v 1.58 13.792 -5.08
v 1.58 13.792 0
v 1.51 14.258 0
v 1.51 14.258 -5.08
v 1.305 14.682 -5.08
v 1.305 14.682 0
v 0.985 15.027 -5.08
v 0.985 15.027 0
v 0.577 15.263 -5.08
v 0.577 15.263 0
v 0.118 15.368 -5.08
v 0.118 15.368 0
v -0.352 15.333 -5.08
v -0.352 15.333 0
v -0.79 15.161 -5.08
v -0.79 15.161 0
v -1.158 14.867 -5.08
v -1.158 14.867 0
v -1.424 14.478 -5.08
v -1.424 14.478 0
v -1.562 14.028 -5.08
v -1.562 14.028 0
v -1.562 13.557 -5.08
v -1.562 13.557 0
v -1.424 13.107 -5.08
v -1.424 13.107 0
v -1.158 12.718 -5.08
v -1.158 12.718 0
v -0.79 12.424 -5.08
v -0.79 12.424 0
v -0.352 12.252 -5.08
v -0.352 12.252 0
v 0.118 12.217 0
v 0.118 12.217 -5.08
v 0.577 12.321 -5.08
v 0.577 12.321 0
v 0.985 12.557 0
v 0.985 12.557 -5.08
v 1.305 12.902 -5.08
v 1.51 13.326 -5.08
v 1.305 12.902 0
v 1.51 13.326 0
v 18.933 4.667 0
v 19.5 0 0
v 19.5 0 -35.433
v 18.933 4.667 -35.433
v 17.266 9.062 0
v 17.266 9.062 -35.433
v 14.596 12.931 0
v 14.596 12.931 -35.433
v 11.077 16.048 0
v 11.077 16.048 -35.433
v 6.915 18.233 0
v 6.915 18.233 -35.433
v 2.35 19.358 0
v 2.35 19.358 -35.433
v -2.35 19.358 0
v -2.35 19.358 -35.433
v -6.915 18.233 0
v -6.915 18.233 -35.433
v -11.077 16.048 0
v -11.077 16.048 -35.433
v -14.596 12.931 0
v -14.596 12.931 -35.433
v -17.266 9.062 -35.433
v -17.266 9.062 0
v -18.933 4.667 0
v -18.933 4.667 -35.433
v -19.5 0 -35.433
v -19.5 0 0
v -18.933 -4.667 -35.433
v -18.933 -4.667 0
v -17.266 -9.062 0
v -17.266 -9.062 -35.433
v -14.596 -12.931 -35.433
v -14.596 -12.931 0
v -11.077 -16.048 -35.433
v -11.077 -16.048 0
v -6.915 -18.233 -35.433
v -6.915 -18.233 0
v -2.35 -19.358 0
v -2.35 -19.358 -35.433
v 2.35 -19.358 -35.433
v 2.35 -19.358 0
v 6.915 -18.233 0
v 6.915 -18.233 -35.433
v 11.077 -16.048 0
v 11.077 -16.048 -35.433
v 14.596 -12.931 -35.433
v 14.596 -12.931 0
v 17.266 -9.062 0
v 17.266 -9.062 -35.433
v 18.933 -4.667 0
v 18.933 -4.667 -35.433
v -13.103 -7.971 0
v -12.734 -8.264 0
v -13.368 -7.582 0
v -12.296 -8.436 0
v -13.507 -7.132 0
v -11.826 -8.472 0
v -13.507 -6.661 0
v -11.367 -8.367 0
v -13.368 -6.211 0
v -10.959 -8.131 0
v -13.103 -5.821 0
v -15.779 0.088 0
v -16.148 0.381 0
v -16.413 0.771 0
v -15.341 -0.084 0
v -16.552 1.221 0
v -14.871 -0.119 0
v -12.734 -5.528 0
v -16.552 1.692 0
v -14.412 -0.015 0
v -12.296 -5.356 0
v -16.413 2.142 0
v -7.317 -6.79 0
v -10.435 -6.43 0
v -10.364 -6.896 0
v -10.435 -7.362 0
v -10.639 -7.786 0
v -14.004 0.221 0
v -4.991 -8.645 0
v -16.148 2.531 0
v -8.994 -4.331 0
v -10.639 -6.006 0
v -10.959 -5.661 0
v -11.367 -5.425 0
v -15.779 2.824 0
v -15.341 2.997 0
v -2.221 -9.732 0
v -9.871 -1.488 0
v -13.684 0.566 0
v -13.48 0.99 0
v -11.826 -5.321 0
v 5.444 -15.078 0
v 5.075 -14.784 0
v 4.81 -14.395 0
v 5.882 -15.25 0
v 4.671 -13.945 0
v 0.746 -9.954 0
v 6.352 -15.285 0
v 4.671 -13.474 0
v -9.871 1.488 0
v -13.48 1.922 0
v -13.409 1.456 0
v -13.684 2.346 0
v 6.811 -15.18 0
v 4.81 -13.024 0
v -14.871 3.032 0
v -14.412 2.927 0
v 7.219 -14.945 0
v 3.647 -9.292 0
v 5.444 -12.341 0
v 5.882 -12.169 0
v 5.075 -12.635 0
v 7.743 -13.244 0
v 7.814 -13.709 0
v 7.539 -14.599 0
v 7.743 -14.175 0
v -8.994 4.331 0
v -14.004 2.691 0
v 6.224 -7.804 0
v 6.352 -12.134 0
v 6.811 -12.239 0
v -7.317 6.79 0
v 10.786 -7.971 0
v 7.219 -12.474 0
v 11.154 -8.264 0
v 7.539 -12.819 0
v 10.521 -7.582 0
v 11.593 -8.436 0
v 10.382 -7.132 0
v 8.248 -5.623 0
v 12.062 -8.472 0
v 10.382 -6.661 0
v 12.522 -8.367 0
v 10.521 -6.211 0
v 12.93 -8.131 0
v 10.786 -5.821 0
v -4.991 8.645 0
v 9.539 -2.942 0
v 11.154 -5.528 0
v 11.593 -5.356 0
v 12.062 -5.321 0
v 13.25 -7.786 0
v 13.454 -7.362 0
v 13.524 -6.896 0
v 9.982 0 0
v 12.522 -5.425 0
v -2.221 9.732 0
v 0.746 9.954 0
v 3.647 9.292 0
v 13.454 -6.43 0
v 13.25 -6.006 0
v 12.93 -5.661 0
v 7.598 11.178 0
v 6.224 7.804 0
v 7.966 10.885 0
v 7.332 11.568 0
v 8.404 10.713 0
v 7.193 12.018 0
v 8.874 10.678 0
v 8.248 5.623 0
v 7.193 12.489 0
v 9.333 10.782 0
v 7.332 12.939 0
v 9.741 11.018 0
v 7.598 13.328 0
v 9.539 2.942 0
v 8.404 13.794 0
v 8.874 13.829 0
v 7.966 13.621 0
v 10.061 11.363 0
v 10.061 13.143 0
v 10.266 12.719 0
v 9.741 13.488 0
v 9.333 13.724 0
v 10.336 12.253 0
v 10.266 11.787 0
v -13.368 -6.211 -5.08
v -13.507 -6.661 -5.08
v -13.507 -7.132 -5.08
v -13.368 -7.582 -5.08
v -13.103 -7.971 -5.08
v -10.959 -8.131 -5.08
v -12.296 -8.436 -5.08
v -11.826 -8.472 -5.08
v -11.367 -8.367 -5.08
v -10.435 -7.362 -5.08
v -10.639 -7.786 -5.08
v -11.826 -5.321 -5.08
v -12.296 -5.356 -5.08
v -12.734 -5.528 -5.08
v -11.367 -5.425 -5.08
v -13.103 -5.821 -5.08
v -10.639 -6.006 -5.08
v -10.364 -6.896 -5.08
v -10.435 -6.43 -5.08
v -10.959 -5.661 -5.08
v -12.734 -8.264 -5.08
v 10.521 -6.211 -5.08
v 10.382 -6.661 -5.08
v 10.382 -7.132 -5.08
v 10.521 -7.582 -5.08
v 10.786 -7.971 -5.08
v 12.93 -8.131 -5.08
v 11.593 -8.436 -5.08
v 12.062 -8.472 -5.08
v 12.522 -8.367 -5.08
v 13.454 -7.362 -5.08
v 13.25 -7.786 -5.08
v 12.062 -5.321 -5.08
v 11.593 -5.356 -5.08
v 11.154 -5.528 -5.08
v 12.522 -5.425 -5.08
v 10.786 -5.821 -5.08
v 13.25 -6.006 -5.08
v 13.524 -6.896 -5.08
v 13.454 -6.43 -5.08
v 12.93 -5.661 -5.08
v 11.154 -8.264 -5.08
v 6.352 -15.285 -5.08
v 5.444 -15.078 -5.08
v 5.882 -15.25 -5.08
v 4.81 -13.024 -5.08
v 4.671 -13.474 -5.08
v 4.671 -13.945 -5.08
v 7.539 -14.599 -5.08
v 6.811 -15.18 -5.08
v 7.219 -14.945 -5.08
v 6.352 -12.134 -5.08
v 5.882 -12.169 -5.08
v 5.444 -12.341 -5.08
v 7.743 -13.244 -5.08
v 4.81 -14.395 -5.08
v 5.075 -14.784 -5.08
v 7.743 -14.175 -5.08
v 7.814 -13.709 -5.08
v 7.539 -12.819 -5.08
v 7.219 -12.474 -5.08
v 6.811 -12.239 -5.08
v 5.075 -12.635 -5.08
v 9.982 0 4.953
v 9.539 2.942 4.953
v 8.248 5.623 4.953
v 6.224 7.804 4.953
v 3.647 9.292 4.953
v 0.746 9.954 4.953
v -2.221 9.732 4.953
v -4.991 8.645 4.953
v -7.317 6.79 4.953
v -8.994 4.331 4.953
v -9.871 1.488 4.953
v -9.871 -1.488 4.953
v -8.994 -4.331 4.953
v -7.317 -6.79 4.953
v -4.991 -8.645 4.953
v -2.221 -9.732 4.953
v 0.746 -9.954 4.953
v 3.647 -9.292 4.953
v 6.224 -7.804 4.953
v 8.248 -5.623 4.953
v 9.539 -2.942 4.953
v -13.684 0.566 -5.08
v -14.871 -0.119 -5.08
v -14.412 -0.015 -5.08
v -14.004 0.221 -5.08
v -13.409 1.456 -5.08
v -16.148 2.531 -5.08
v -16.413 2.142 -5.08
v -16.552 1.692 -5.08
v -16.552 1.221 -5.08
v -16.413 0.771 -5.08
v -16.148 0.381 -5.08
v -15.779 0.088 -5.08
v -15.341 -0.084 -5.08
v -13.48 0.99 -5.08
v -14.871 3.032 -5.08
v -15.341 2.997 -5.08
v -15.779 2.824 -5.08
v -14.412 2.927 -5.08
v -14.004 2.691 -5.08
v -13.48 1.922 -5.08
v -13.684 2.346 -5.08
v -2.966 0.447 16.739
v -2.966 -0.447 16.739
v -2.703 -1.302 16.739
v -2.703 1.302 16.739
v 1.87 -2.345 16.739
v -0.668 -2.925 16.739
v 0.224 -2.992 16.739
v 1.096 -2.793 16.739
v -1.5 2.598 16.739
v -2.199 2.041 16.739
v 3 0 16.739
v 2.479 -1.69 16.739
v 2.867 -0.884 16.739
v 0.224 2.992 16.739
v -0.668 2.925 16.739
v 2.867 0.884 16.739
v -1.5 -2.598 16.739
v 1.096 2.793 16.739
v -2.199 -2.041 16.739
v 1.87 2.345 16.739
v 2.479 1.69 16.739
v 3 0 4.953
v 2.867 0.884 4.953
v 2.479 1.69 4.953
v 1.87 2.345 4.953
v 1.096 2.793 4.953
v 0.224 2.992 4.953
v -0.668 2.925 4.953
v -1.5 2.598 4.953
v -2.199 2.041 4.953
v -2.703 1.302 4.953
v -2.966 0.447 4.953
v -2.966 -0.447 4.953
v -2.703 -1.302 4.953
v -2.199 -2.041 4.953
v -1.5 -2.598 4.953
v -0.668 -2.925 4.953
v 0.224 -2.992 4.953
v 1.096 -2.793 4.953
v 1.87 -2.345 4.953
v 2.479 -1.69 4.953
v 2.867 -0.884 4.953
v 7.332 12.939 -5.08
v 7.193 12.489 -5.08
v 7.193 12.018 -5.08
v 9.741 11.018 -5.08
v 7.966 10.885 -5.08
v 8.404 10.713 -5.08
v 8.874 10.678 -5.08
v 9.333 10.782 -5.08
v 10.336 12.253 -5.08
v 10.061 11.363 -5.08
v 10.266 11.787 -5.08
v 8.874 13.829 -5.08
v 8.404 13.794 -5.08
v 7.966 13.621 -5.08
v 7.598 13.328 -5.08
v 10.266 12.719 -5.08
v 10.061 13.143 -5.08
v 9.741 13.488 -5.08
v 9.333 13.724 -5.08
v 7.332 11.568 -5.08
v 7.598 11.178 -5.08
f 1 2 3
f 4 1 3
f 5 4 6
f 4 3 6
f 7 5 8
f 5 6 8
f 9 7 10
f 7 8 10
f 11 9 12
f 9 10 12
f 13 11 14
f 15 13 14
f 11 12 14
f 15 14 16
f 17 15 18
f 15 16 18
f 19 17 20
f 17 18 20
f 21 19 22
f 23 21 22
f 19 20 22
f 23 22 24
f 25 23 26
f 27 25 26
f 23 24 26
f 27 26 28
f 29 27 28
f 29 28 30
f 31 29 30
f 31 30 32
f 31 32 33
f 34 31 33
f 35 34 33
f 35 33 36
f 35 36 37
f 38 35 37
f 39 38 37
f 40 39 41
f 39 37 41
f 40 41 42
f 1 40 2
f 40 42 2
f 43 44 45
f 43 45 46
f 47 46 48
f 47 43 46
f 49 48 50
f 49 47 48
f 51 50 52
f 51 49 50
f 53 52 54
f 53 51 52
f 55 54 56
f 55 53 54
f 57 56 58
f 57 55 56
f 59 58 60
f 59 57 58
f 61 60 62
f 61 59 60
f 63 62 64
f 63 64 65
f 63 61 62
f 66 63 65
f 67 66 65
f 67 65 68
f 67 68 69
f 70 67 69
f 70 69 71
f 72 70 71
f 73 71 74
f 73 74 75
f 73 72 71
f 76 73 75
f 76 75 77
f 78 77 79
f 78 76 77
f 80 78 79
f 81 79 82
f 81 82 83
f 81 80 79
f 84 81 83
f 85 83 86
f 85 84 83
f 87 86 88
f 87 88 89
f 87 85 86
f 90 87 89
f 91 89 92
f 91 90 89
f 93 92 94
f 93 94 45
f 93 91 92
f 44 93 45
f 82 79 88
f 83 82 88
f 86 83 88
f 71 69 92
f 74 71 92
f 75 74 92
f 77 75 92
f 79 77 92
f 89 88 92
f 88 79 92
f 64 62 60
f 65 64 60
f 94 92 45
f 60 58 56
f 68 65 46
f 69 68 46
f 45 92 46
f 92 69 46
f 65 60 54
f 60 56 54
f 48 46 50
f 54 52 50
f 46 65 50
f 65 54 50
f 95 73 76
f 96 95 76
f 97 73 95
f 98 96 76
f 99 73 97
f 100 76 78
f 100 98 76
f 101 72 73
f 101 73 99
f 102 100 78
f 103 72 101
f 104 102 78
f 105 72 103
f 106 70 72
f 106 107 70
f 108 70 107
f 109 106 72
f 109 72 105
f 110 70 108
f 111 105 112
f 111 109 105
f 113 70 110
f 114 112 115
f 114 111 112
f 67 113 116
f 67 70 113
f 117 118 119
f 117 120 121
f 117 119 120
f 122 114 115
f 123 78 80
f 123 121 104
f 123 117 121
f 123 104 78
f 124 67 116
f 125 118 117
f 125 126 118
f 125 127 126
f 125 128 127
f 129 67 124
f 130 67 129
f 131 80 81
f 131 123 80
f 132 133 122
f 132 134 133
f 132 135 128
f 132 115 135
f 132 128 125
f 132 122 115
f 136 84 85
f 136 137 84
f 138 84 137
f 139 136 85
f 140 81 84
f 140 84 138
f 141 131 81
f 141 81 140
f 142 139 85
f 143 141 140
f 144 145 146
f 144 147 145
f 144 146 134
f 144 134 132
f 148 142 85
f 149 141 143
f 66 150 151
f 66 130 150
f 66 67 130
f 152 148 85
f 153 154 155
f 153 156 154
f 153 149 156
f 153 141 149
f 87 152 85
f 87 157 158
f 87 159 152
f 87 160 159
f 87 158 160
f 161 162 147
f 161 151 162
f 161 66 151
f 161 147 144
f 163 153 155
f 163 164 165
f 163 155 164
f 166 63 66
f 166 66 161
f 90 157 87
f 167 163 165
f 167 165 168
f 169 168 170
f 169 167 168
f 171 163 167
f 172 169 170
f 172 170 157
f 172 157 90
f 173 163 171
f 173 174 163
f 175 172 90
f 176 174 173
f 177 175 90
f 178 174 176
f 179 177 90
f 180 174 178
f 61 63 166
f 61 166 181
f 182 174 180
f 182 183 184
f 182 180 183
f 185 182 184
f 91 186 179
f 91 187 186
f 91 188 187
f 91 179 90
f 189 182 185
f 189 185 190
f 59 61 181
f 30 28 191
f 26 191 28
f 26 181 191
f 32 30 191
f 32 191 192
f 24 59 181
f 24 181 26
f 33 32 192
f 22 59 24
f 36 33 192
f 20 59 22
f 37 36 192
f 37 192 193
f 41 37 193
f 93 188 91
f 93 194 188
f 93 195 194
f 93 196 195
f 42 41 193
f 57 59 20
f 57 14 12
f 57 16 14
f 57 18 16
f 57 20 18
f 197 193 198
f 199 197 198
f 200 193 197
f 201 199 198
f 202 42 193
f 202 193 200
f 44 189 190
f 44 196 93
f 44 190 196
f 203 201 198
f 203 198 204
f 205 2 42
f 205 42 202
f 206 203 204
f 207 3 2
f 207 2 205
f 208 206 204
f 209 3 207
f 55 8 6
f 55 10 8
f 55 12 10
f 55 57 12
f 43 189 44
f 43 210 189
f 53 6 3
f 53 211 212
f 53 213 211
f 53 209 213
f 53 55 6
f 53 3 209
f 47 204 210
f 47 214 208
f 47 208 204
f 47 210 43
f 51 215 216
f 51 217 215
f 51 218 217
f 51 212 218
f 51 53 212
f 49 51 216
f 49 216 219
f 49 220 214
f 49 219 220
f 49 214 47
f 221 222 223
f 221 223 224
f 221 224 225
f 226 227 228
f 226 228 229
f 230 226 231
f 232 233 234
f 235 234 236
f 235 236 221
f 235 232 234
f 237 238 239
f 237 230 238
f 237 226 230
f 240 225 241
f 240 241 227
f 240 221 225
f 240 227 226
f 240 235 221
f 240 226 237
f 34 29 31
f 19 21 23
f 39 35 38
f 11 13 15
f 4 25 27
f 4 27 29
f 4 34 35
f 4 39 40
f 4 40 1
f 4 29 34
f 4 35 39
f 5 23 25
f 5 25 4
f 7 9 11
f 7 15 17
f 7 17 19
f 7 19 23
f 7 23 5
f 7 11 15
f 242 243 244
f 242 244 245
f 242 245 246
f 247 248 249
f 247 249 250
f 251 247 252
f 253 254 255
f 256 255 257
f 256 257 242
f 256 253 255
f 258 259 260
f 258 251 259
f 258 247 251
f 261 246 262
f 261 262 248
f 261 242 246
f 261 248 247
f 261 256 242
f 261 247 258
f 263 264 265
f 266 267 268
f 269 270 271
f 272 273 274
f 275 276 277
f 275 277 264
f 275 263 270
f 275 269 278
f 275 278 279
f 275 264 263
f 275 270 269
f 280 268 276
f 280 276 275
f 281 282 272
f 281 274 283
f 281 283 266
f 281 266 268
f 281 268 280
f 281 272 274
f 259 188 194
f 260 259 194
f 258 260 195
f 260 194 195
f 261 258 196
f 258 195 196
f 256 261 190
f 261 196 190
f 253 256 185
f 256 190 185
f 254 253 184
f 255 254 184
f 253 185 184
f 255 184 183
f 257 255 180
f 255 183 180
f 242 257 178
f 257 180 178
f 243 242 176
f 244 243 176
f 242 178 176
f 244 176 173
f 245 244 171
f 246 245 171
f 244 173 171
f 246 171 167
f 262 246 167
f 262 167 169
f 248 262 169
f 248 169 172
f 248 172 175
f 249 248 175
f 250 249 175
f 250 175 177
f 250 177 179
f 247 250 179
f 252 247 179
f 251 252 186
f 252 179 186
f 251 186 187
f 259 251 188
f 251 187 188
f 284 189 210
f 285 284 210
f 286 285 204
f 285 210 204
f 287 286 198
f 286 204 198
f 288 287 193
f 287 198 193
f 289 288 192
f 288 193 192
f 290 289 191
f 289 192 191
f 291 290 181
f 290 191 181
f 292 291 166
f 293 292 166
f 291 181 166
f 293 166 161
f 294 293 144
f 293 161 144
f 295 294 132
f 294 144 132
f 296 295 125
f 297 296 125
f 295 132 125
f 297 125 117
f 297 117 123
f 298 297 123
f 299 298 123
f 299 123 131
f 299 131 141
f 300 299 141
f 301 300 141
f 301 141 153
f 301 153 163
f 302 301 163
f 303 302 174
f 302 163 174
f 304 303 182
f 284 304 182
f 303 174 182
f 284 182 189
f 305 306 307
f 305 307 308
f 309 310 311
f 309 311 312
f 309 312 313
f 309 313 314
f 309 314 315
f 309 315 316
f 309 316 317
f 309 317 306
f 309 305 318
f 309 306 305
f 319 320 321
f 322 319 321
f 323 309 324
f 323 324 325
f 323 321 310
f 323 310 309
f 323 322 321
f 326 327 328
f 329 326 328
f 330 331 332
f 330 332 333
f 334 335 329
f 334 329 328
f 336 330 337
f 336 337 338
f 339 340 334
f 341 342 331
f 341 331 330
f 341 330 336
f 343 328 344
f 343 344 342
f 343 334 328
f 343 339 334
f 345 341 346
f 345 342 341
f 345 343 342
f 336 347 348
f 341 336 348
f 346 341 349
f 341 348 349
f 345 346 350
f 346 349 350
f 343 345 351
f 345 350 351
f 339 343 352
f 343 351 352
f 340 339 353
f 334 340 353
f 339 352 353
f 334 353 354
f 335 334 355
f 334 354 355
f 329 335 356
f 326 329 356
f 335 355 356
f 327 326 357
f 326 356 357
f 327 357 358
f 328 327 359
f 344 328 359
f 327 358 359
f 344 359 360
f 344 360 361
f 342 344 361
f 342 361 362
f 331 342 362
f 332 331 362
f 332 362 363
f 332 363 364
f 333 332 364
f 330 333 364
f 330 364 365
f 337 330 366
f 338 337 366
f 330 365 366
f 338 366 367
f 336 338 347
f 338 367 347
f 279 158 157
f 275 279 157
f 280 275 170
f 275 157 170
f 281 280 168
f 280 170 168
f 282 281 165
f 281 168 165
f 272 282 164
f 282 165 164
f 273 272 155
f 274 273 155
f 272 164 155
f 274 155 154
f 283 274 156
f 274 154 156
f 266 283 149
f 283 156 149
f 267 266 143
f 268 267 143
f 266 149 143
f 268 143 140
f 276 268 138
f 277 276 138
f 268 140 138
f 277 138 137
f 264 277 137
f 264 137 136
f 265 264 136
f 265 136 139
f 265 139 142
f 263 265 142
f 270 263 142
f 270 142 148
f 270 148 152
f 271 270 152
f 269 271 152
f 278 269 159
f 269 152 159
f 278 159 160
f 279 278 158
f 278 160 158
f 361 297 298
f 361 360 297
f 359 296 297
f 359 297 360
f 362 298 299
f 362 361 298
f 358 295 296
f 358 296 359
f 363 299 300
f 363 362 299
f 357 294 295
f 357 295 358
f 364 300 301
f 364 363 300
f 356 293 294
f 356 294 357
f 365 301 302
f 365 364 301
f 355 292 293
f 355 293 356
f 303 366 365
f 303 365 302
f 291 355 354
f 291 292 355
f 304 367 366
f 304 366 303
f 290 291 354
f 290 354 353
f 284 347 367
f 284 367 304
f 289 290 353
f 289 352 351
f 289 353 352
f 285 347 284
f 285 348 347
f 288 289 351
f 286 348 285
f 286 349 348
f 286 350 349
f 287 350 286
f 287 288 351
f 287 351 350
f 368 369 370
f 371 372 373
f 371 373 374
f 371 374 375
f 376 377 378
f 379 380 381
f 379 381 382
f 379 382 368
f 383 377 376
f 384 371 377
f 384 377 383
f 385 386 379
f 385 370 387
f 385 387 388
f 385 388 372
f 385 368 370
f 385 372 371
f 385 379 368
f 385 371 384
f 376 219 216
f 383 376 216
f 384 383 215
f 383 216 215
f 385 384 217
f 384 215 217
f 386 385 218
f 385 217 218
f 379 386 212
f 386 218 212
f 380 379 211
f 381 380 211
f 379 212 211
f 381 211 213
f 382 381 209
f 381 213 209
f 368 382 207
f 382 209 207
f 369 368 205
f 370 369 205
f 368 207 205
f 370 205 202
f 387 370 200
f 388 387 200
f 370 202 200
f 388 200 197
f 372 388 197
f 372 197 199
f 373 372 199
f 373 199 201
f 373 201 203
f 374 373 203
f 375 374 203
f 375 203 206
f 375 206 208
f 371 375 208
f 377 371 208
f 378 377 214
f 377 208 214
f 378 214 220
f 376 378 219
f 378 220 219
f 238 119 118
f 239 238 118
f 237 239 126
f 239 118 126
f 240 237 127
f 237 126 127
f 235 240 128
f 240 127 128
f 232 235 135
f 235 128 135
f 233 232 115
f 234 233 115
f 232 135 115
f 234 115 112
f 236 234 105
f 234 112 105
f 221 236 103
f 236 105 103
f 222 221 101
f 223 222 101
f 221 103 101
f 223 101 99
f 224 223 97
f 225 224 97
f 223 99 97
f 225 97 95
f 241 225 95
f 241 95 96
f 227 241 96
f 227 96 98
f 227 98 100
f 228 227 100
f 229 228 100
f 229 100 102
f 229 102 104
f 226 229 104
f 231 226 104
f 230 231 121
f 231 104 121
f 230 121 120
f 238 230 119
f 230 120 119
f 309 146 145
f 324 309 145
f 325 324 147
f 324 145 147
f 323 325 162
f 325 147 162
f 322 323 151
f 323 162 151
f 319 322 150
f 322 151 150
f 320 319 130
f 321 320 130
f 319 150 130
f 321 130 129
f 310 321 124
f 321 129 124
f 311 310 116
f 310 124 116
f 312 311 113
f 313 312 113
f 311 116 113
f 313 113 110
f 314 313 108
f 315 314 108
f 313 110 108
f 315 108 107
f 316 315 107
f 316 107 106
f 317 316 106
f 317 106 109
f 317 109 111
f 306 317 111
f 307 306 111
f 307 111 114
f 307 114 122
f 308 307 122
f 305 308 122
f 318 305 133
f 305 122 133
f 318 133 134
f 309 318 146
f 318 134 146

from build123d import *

# Parameters (mm, degrees)
SKETCH1_R           = 19.5
BOSS_EXTRUDE1_DEPTH = 35.433
SKETCH2_R           = 9.9822
BOSS_EXTRUDE2_DEPTH = 4.953
SKETCH4_R           = 3
BOSS_EXTRUDE3_DEPTH = 11.7856
SKETCH5_R           = 1.58
CUT_EXTRUDE1_DEPTH  = 5.08


with BuildPart() as part:
    # Sketch1 → Boss-Extrude1 (new body)
    with BuildSketch(Plane.XY):
        Circle(SKETCH1_R)
    extrude(amount=-BOSS_EXTRUDE1_DEPTH)

    # Sketch2 → Boss-Extrude2 (add)
    with BuildSketch(Plane.XY):
        Circle(SKETCH2_R)
    extrude(amount=BOSS_EXTRUDE2_DEPTH)

    # Sketch4 → Boss-Extrude3 (add)
    with BuildSketch(Plane.XY.offset(4.953)):
        Circle(SKETCH4_R)
    extrude(amount=BOSS_EXTRUDE3_DEPTH)

    # Sketch5 → Cut-Extrude1 (cut)
    with BuildSketch(Plane.XY):
        with Locations((-11.944395574, -6.8961)):
            Circle(SKETCH5_R)
        with Locations((11.944395574, -6.8961)):
            Circle(SKETCH5_R)
        with Locations((0, 13.7922)):
            Circle(SKETCH5_R)
        with Locations((8.755768371, 12.253167763)):
            Circle(SKETCH5_R)
        with Locations((6.233670374, -13.709301721)):
            Circle(SKETCH5_R)
        with Locations((-14.989438745, 1.456133958)):
            Circle(SKETCH5_R)
    extrude(amount=-CUT_EXTRUDE1_DEPTH, mode=Mode.SUBTRACT)


solid = part.part
